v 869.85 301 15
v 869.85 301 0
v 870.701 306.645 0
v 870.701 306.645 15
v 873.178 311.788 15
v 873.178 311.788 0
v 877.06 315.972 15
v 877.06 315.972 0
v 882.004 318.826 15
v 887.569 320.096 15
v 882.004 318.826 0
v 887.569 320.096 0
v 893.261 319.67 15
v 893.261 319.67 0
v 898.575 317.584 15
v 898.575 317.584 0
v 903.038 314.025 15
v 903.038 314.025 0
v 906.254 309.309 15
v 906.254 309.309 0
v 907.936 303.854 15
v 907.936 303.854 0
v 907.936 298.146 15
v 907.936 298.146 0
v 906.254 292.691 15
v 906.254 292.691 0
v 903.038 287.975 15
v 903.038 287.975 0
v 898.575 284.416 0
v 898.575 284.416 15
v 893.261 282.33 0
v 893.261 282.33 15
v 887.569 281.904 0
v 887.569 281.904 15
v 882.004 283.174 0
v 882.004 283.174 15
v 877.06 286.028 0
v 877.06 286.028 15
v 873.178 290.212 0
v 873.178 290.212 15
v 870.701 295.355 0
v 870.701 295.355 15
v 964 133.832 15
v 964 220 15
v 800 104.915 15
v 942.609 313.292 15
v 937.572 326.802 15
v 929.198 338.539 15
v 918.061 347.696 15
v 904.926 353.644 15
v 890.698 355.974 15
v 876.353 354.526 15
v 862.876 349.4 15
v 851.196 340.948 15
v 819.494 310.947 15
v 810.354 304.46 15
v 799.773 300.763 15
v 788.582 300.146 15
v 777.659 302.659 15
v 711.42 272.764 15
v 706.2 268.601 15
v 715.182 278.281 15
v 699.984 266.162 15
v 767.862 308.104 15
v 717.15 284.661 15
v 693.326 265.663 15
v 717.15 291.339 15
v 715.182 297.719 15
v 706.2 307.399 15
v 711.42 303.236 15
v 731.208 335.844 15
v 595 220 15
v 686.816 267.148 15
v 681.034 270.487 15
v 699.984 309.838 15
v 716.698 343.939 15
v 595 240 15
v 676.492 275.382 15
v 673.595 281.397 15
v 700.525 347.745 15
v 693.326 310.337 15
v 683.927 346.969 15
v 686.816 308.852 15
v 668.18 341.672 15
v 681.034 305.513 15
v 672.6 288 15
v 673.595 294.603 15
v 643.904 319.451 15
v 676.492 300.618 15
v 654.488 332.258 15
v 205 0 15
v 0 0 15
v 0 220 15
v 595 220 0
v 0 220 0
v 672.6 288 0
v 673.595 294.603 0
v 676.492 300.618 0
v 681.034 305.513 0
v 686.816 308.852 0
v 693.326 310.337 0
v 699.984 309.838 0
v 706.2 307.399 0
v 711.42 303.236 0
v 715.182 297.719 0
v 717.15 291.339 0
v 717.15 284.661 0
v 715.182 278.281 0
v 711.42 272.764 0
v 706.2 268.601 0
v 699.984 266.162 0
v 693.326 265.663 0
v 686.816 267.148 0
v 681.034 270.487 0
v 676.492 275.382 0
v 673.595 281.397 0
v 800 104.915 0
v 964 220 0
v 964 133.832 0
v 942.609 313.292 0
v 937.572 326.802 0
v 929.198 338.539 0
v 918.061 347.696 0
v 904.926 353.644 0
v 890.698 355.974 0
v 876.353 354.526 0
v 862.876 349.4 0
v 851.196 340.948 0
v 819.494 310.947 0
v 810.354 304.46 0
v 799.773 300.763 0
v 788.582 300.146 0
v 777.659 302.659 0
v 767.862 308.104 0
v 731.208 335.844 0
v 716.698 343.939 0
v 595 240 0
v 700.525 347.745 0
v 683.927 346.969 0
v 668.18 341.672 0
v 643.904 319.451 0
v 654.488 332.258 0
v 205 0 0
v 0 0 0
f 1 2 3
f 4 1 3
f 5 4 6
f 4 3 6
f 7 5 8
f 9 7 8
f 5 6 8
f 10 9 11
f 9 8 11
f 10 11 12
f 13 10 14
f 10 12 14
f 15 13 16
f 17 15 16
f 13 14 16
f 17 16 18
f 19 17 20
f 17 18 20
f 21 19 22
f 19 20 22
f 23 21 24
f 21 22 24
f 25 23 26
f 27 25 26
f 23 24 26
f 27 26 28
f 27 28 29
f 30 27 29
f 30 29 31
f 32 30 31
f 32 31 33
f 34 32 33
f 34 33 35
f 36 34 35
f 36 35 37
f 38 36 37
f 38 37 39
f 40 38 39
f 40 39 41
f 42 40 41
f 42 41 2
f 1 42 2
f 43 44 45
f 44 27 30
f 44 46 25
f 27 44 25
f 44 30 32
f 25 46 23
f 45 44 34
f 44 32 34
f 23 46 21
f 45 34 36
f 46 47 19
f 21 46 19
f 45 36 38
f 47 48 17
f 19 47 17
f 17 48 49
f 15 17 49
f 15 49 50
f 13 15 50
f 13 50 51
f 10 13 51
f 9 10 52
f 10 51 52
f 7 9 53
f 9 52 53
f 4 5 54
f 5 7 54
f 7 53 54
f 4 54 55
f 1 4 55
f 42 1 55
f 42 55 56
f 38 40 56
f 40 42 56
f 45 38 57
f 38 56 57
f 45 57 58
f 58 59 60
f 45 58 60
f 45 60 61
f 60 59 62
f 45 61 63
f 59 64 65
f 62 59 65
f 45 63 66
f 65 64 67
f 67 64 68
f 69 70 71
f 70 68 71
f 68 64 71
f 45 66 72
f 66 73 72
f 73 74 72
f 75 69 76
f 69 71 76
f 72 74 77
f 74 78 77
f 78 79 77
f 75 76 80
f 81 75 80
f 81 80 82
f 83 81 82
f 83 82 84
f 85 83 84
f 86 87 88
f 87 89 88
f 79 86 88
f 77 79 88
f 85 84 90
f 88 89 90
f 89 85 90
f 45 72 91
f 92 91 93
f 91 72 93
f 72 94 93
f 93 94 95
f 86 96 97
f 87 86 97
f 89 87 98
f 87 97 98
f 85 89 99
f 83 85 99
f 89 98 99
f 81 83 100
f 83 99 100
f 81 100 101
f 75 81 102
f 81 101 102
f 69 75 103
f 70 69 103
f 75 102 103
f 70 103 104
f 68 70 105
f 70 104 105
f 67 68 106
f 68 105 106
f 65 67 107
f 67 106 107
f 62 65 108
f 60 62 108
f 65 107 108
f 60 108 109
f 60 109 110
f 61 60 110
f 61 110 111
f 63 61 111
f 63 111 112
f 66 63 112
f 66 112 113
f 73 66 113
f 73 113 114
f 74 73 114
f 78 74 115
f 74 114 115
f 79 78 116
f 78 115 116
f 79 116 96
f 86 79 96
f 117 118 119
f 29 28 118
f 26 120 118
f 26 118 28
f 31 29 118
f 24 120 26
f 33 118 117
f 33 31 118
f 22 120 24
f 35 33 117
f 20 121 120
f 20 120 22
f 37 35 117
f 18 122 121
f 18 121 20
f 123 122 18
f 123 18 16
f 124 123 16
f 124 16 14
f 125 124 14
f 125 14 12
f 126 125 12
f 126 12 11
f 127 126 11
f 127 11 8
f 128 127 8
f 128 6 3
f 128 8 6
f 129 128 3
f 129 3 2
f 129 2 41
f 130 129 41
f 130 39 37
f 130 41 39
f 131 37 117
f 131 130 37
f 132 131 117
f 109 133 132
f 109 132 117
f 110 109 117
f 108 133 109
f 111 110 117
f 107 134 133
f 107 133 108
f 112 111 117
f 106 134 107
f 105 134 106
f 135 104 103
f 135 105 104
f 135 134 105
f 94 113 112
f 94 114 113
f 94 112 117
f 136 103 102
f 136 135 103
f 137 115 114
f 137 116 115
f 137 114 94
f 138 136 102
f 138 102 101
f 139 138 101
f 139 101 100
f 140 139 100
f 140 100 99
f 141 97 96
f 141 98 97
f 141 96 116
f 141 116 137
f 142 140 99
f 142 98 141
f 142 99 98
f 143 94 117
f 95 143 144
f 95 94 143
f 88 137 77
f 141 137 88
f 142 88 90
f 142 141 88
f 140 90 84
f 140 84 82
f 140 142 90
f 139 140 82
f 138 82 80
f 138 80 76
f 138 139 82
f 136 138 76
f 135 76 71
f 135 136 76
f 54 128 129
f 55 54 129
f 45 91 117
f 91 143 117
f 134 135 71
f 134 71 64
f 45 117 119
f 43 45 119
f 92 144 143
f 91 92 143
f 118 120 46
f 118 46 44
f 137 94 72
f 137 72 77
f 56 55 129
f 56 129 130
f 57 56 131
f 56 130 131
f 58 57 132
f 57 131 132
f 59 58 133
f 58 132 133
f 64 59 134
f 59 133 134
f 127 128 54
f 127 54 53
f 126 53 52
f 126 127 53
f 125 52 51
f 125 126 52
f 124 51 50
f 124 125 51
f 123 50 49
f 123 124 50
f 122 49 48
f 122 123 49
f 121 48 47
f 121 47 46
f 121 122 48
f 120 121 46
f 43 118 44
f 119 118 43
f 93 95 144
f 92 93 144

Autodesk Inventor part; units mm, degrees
ref_plane "YZ Plane" through (0, 0, 0) normal (1, 0, 0) x (0, 1, 0)
ref_plane "XZ Plane" through (0, 0, 0) normal (0, 1, 0) x (-1, 0, 0)
ref_plane "XY Plane" through (0, 0, 0) normal (0, 0, 1) x (1, 0, 0)
sketch "Sketch2" plane through (0, 0, 0) normal (0, 0, 1) x (1, 0, 0)
  line L0 (0, 264) -> (0, -44) projected
  line L1 (-160, 0) -> (960, 0) projected
  line L2 (0, 0) -> (205, 0)
  line L3 (800, 220) -> (0, 220)
  line L4 (0, 220) -> (0, 0)
  line L5 (800, 104.9146) -> (800, 220)
  line L6 (205, 0) -> (800, 104.9146)
  dimension "d7" = 220
  dimension "d20" = 800
  dimension "d34" = 10
  dimension "d37" = 205
extrude "Extrusion2" add sketch "Sketch2" along normal blind 15
sketch "Sketch5" plane through (0, 0, 0) normal (0, 0, -1) x (-1, 0, 0)
  line L0 (-800, 104.9146) -> (-800, 220) projected
  line L1 (-205, 0) -> (-800, 104.9146) projected
  line L2 (-800, 220) -> (-964, 220)
  line L3 (-964, 220) -> (-964, 133.8322)
  line L4 (-800, 104.9146) -> (-964, 133.8322)
  line L5 (0, 220) -> (0, 0) projected
  dimension "d40" = 964
extrude "Extrusion4" add sketch "Sketch5" against normal up to surface (15 mm away)
sketch "Sketch3" plane through (0, 0, 0) normal (0, 0, -1) x (-1, 0, 0)
  line L0 (0, 220) -> (0, 0) projected
  line L1 (-800, 220) -> (0, 220) projected
  line L2 (-800, 104.9146) -> (-800, 220) projected
  line L3 (-595, 220) -> (-595, 240)
  circle A0 centre (-695, 288) radius 22.4
  circle A1 centre (-889, 301) radius 19.15
  arc A2 (-851.1955, 340.9477) -> (-942.6088, 313.2921) centre (-889, 301) ccw
  arc A3 (-643.9036, 319.4509) -> (-731.2075, 335.8437) centre (-695, 288) ccw
  line L4 (-595, 240) -> (-643.9036, 319.4509)
  line L5 (-942.6088, 313.2921) -> (-964, 220)
  line L6 (-964, 220) -> (-595, 220)
  line L7 (-731.2075, 335.8437) -> (-767.8616, 308.1042)
  line L8 (-851.1955, 340.9477) -> (-819.4942, 310.9471)
  arc A4 (-819.4942, 310.9471) -> (-767.8616, 308.1042) centre (-792, 340) ccw
  dimension "d23" = 44.8
  dimension "d26" = 695
  dimension "d28" = 68
  dimension "d29" = 20
  dimension "d35" = 100
  dimension "d41" = 38.3
  dimension "d42" = 81
  dimension "d43" = 194
  dimension "d45" = 110
  dimension "d46" = 60
  dimension "d47" = 97
  dimension "d48" = 40
  dimension "d49" = 120
extrude "Extrusion3" add sketch "Sketch3" against normal up to surface (15 mm away)
equation "\"d47\" = 0.5 * d43"
properties part number "Plate" material "EN10025 P6 2004 S690QL"
